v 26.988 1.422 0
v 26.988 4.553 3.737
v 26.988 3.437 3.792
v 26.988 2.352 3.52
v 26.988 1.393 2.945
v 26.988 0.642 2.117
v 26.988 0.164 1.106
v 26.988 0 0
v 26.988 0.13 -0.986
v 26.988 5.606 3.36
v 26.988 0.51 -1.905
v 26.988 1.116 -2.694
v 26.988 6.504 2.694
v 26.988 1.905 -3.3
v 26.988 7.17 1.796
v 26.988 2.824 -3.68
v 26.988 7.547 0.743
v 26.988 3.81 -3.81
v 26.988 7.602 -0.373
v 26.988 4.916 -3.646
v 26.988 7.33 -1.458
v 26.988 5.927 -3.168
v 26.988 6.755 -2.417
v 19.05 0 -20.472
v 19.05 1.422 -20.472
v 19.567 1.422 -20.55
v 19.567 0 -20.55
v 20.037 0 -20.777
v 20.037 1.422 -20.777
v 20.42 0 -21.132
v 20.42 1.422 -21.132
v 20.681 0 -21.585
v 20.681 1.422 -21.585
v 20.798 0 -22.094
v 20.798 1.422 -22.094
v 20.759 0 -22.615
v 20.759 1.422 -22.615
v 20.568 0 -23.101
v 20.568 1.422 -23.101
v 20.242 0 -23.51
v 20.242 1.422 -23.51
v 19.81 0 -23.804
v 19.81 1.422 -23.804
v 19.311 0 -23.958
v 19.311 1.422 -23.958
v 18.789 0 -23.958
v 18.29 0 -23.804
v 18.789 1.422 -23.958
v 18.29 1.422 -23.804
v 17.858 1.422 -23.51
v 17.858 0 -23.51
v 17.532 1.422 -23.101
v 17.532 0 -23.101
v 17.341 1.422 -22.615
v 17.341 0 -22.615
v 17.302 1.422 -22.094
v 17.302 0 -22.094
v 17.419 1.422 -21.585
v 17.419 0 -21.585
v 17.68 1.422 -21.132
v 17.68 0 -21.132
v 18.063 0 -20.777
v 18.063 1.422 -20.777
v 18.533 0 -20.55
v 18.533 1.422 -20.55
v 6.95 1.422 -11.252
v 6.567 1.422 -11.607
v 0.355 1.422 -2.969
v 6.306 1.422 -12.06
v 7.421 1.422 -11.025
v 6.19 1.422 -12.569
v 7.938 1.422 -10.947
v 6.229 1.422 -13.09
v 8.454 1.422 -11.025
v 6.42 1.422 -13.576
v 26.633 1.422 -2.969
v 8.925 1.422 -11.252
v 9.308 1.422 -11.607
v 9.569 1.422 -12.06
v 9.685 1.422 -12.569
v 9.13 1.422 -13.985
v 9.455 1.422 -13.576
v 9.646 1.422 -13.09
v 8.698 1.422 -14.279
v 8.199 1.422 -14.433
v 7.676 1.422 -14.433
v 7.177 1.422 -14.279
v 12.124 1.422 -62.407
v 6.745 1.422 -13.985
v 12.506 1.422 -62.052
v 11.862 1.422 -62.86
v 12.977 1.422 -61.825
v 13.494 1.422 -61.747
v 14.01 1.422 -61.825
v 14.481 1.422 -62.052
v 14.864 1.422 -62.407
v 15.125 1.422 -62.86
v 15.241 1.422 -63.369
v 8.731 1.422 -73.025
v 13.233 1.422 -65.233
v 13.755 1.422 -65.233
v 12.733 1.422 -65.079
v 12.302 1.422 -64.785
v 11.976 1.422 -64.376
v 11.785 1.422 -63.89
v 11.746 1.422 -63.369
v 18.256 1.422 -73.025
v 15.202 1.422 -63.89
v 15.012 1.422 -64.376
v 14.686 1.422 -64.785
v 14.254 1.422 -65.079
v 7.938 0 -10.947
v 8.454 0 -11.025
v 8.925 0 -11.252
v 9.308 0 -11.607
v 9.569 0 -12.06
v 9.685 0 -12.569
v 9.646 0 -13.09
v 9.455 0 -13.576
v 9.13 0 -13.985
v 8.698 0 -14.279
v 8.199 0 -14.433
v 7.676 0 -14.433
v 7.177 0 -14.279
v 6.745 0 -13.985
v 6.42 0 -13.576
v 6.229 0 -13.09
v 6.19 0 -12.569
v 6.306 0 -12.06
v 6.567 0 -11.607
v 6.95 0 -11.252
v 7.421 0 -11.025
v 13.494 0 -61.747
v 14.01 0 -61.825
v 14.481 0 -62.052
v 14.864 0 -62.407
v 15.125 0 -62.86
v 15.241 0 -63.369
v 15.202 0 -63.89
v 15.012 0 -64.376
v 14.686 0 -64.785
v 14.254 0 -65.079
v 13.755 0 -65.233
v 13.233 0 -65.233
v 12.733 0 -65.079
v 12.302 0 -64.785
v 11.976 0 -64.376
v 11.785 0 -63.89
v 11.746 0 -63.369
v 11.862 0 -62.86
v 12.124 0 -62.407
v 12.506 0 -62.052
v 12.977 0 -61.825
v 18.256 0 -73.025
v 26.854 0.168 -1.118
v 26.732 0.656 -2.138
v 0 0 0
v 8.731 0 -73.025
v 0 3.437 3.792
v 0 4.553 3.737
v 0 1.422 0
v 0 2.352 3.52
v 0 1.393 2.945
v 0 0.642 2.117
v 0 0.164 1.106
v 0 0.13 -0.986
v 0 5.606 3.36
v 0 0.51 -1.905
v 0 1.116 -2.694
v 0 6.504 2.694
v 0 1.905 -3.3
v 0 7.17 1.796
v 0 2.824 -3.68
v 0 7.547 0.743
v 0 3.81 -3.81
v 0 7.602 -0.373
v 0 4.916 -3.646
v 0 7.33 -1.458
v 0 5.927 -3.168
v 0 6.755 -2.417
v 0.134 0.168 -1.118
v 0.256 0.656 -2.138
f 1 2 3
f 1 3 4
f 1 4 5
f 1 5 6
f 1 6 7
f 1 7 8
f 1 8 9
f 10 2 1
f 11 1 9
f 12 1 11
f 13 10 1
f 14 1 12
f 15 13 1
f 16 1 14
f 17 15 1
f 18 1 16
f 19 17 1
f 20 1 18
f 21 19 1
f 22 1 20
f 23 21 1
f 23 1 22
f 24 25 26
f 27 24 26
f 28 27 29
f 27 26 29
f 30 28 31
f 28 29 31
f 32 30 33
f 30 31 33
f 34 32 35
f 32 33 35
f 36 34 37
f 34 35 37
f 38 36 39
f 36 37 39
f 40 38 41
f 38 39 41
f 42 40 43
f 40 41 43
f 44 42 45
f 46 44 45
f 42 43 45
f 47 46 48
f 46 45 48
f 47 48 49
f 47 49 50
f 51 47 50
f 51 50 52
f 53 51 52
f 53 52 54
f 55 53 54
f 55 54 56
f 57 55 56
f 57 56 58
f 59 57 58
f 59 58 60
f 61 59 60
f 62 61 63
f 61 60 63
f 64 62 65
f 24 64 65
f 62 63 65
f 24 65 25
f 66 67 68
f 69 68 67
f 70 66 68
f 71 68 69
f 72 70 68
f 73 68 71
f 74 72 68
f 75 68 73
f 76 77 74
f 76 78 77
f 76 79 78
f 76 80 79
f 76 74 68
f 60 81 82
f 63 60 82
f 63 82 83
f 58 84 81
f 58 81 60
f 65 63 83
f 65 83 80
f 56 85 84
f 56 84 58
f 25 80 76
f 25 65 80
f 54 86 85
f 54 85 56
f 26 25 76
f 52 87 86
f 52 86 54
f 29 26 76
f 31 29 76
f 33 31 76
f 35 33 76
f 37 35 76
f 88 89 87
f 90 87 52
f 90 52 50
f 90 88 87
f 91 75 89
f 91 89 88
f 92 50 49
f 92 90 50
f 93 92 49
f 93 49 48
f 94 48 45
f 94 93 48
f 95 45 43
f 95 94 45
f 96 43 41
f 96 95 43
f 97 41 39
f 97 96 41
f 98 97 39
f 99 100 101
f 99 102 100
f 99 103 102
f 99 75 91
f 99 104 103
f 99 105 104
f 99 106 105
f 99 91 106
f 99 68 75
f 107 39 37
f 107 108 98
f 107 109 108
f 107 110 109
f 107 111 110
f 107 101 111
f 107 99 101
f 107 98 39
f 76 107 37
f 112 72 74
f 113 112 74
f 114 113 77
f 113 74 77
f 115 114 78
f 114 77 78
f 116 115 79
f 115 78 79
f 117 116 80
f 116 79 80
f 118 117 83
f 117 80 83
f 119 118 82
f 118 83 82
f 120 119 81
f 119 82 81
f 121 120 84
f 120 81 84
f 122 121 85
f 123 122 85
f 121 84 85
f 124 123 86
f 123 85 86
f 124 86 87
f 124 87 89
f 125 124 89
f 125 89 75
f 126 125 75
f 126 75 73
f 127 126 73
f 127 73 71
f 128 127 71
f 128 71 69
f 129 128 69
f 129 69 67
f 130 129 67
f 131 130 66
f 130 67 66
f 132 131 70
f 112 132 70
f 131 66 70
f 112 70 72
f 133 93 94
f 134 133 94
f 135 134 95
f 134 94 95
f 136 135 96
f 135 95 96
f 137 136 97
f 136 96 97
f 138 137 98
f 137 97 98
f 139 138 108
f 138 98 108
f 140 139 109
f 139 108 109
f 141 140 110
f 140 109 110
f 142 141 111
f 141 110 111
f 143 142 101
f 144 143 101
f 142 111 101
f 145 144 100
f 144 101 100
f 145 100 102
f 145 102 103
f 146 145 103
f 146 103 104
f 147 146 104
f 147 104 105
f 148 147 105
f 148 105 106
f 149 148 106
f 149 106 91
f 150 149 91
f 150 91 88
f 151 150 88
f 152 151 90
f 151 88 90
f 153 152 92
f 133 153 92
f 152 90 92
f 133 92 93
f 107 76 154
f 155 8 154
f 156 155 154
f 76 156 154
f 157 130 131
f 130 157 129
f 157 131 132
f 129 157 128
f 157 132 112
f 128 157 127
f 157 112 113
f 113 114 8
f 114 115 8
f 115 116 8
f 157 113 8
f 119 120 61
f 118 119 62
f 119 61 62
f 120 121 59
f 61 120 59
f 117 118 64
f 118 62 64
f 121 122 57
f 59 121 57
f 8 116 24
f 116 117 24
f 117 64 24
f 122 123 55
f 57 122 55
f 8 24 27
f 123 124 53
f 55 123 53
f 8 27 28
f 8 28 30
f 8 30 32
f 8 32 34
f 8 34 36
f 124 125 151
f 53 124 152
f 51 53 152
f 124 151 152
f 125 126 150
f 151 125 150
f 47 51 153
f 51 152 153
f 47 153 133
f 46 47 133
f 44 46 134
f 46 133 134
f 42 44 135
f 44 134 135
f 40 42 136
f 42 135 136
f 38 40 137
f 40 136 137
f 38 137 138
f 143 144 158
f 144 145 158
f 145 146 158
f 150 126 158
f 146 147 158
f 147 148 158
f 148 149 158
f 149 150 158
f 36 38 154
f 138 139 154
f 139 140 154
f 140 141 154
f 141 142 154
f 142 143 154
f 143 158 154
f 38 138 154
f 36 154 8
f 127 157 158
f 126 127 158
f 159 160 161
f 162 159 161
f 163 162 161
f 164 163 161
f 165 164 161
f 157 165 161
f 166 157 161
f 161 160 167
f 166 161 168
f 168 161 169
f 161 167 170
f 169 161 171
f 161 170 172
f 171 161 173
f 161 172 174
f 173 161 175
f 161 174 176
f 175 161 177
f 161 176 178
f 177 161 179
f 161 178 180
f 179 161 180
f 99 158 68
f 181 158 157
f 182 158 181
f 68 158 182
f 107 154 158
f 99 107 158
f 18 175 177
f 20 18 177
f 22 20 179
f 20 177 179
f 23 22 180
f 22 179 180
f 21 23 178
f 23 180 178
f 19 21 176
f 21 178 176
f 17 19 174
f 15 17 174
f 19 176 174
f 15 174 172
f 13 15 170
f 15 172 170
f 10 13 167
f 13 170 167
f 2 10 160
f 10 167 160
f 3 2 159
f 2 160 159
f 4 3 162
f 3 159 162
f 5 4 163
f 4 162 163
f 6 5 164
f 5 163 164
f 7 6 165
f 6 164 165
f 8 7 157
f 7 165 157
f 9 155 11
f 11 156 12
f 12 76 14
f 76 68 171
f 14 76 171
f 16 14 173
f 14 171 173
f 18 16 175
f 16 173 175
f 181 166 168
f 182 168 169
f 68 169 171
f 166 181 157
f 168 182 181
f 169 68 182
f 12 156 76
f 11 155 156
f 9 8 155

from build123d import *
from build123d.topology import SkipClean

# Parameters (mm, degrees)
BOSS_EXTRUDE1_DEPTH = 1.4224
SKETCH2_R           = 3.81
BOSS_EXTRUDE2_DEPTH = 26.9875
SKETCH3_R           = 1.7526
CUT_EXTRUDE1_DEPTH  = 1.4224


with BuildPart() as part:
    # Sketch1 → Boss-Extrude1 (new body)
    with BuildSketch(Plane(origin=(0, 0, 0), x_dir=(1, 0, 0), z_dir=(0, 1, 0))):
        Polygon((0, 0), (26.9875, 0), (18.25625, 73.025), (8.73125, 73.025), align=None)
    extrude(amount=BOSS_EXTRUDE1_DEPTH)

    # Sketch2 → Boss-Extrude2 (add)
    with SkipClean():  # the faces are left unmerged after this step: merging them gives an invalid solid
        with BuildSketch(Plane(origin=(0, 0, 0), x_dir=(0, 0, -1), z_dir=(1, 0, 0))):
            with Locations((0, 3.81)):
                Circle(SKETCH2_R)
        extrude(amount=BOSS_EXTRUDE2_DEPTH)

    # Sketch3 → Cut-Extrude1 (cut)
    with SkipClean():  # the faces are left unmerged after this step: merging them gives an invalid solid
        with BuildSketch(Plane(origin=(0, 1.4224, 0), x_dir=(1, 0, 0), z_dir=(0, 1, 0))):
            with Locations(Location((13.49375, 63.5, 0), (0, 0, 270))):
                Circle(SKETCH3_R)
            with Locations(Location((7.9375, 12.7, 0), (0, 0, 270))):
                Circle(SKETCH3_R)
            with Locations(Location((19.05, 22.225, 0), (0, 0, 270))):
                Circle(SKETCH3_R)
        extrude(amount=-CUT_EXTRUDE1_DEPTH, mode=Mode.SUBTRACT)


solid = part.part
